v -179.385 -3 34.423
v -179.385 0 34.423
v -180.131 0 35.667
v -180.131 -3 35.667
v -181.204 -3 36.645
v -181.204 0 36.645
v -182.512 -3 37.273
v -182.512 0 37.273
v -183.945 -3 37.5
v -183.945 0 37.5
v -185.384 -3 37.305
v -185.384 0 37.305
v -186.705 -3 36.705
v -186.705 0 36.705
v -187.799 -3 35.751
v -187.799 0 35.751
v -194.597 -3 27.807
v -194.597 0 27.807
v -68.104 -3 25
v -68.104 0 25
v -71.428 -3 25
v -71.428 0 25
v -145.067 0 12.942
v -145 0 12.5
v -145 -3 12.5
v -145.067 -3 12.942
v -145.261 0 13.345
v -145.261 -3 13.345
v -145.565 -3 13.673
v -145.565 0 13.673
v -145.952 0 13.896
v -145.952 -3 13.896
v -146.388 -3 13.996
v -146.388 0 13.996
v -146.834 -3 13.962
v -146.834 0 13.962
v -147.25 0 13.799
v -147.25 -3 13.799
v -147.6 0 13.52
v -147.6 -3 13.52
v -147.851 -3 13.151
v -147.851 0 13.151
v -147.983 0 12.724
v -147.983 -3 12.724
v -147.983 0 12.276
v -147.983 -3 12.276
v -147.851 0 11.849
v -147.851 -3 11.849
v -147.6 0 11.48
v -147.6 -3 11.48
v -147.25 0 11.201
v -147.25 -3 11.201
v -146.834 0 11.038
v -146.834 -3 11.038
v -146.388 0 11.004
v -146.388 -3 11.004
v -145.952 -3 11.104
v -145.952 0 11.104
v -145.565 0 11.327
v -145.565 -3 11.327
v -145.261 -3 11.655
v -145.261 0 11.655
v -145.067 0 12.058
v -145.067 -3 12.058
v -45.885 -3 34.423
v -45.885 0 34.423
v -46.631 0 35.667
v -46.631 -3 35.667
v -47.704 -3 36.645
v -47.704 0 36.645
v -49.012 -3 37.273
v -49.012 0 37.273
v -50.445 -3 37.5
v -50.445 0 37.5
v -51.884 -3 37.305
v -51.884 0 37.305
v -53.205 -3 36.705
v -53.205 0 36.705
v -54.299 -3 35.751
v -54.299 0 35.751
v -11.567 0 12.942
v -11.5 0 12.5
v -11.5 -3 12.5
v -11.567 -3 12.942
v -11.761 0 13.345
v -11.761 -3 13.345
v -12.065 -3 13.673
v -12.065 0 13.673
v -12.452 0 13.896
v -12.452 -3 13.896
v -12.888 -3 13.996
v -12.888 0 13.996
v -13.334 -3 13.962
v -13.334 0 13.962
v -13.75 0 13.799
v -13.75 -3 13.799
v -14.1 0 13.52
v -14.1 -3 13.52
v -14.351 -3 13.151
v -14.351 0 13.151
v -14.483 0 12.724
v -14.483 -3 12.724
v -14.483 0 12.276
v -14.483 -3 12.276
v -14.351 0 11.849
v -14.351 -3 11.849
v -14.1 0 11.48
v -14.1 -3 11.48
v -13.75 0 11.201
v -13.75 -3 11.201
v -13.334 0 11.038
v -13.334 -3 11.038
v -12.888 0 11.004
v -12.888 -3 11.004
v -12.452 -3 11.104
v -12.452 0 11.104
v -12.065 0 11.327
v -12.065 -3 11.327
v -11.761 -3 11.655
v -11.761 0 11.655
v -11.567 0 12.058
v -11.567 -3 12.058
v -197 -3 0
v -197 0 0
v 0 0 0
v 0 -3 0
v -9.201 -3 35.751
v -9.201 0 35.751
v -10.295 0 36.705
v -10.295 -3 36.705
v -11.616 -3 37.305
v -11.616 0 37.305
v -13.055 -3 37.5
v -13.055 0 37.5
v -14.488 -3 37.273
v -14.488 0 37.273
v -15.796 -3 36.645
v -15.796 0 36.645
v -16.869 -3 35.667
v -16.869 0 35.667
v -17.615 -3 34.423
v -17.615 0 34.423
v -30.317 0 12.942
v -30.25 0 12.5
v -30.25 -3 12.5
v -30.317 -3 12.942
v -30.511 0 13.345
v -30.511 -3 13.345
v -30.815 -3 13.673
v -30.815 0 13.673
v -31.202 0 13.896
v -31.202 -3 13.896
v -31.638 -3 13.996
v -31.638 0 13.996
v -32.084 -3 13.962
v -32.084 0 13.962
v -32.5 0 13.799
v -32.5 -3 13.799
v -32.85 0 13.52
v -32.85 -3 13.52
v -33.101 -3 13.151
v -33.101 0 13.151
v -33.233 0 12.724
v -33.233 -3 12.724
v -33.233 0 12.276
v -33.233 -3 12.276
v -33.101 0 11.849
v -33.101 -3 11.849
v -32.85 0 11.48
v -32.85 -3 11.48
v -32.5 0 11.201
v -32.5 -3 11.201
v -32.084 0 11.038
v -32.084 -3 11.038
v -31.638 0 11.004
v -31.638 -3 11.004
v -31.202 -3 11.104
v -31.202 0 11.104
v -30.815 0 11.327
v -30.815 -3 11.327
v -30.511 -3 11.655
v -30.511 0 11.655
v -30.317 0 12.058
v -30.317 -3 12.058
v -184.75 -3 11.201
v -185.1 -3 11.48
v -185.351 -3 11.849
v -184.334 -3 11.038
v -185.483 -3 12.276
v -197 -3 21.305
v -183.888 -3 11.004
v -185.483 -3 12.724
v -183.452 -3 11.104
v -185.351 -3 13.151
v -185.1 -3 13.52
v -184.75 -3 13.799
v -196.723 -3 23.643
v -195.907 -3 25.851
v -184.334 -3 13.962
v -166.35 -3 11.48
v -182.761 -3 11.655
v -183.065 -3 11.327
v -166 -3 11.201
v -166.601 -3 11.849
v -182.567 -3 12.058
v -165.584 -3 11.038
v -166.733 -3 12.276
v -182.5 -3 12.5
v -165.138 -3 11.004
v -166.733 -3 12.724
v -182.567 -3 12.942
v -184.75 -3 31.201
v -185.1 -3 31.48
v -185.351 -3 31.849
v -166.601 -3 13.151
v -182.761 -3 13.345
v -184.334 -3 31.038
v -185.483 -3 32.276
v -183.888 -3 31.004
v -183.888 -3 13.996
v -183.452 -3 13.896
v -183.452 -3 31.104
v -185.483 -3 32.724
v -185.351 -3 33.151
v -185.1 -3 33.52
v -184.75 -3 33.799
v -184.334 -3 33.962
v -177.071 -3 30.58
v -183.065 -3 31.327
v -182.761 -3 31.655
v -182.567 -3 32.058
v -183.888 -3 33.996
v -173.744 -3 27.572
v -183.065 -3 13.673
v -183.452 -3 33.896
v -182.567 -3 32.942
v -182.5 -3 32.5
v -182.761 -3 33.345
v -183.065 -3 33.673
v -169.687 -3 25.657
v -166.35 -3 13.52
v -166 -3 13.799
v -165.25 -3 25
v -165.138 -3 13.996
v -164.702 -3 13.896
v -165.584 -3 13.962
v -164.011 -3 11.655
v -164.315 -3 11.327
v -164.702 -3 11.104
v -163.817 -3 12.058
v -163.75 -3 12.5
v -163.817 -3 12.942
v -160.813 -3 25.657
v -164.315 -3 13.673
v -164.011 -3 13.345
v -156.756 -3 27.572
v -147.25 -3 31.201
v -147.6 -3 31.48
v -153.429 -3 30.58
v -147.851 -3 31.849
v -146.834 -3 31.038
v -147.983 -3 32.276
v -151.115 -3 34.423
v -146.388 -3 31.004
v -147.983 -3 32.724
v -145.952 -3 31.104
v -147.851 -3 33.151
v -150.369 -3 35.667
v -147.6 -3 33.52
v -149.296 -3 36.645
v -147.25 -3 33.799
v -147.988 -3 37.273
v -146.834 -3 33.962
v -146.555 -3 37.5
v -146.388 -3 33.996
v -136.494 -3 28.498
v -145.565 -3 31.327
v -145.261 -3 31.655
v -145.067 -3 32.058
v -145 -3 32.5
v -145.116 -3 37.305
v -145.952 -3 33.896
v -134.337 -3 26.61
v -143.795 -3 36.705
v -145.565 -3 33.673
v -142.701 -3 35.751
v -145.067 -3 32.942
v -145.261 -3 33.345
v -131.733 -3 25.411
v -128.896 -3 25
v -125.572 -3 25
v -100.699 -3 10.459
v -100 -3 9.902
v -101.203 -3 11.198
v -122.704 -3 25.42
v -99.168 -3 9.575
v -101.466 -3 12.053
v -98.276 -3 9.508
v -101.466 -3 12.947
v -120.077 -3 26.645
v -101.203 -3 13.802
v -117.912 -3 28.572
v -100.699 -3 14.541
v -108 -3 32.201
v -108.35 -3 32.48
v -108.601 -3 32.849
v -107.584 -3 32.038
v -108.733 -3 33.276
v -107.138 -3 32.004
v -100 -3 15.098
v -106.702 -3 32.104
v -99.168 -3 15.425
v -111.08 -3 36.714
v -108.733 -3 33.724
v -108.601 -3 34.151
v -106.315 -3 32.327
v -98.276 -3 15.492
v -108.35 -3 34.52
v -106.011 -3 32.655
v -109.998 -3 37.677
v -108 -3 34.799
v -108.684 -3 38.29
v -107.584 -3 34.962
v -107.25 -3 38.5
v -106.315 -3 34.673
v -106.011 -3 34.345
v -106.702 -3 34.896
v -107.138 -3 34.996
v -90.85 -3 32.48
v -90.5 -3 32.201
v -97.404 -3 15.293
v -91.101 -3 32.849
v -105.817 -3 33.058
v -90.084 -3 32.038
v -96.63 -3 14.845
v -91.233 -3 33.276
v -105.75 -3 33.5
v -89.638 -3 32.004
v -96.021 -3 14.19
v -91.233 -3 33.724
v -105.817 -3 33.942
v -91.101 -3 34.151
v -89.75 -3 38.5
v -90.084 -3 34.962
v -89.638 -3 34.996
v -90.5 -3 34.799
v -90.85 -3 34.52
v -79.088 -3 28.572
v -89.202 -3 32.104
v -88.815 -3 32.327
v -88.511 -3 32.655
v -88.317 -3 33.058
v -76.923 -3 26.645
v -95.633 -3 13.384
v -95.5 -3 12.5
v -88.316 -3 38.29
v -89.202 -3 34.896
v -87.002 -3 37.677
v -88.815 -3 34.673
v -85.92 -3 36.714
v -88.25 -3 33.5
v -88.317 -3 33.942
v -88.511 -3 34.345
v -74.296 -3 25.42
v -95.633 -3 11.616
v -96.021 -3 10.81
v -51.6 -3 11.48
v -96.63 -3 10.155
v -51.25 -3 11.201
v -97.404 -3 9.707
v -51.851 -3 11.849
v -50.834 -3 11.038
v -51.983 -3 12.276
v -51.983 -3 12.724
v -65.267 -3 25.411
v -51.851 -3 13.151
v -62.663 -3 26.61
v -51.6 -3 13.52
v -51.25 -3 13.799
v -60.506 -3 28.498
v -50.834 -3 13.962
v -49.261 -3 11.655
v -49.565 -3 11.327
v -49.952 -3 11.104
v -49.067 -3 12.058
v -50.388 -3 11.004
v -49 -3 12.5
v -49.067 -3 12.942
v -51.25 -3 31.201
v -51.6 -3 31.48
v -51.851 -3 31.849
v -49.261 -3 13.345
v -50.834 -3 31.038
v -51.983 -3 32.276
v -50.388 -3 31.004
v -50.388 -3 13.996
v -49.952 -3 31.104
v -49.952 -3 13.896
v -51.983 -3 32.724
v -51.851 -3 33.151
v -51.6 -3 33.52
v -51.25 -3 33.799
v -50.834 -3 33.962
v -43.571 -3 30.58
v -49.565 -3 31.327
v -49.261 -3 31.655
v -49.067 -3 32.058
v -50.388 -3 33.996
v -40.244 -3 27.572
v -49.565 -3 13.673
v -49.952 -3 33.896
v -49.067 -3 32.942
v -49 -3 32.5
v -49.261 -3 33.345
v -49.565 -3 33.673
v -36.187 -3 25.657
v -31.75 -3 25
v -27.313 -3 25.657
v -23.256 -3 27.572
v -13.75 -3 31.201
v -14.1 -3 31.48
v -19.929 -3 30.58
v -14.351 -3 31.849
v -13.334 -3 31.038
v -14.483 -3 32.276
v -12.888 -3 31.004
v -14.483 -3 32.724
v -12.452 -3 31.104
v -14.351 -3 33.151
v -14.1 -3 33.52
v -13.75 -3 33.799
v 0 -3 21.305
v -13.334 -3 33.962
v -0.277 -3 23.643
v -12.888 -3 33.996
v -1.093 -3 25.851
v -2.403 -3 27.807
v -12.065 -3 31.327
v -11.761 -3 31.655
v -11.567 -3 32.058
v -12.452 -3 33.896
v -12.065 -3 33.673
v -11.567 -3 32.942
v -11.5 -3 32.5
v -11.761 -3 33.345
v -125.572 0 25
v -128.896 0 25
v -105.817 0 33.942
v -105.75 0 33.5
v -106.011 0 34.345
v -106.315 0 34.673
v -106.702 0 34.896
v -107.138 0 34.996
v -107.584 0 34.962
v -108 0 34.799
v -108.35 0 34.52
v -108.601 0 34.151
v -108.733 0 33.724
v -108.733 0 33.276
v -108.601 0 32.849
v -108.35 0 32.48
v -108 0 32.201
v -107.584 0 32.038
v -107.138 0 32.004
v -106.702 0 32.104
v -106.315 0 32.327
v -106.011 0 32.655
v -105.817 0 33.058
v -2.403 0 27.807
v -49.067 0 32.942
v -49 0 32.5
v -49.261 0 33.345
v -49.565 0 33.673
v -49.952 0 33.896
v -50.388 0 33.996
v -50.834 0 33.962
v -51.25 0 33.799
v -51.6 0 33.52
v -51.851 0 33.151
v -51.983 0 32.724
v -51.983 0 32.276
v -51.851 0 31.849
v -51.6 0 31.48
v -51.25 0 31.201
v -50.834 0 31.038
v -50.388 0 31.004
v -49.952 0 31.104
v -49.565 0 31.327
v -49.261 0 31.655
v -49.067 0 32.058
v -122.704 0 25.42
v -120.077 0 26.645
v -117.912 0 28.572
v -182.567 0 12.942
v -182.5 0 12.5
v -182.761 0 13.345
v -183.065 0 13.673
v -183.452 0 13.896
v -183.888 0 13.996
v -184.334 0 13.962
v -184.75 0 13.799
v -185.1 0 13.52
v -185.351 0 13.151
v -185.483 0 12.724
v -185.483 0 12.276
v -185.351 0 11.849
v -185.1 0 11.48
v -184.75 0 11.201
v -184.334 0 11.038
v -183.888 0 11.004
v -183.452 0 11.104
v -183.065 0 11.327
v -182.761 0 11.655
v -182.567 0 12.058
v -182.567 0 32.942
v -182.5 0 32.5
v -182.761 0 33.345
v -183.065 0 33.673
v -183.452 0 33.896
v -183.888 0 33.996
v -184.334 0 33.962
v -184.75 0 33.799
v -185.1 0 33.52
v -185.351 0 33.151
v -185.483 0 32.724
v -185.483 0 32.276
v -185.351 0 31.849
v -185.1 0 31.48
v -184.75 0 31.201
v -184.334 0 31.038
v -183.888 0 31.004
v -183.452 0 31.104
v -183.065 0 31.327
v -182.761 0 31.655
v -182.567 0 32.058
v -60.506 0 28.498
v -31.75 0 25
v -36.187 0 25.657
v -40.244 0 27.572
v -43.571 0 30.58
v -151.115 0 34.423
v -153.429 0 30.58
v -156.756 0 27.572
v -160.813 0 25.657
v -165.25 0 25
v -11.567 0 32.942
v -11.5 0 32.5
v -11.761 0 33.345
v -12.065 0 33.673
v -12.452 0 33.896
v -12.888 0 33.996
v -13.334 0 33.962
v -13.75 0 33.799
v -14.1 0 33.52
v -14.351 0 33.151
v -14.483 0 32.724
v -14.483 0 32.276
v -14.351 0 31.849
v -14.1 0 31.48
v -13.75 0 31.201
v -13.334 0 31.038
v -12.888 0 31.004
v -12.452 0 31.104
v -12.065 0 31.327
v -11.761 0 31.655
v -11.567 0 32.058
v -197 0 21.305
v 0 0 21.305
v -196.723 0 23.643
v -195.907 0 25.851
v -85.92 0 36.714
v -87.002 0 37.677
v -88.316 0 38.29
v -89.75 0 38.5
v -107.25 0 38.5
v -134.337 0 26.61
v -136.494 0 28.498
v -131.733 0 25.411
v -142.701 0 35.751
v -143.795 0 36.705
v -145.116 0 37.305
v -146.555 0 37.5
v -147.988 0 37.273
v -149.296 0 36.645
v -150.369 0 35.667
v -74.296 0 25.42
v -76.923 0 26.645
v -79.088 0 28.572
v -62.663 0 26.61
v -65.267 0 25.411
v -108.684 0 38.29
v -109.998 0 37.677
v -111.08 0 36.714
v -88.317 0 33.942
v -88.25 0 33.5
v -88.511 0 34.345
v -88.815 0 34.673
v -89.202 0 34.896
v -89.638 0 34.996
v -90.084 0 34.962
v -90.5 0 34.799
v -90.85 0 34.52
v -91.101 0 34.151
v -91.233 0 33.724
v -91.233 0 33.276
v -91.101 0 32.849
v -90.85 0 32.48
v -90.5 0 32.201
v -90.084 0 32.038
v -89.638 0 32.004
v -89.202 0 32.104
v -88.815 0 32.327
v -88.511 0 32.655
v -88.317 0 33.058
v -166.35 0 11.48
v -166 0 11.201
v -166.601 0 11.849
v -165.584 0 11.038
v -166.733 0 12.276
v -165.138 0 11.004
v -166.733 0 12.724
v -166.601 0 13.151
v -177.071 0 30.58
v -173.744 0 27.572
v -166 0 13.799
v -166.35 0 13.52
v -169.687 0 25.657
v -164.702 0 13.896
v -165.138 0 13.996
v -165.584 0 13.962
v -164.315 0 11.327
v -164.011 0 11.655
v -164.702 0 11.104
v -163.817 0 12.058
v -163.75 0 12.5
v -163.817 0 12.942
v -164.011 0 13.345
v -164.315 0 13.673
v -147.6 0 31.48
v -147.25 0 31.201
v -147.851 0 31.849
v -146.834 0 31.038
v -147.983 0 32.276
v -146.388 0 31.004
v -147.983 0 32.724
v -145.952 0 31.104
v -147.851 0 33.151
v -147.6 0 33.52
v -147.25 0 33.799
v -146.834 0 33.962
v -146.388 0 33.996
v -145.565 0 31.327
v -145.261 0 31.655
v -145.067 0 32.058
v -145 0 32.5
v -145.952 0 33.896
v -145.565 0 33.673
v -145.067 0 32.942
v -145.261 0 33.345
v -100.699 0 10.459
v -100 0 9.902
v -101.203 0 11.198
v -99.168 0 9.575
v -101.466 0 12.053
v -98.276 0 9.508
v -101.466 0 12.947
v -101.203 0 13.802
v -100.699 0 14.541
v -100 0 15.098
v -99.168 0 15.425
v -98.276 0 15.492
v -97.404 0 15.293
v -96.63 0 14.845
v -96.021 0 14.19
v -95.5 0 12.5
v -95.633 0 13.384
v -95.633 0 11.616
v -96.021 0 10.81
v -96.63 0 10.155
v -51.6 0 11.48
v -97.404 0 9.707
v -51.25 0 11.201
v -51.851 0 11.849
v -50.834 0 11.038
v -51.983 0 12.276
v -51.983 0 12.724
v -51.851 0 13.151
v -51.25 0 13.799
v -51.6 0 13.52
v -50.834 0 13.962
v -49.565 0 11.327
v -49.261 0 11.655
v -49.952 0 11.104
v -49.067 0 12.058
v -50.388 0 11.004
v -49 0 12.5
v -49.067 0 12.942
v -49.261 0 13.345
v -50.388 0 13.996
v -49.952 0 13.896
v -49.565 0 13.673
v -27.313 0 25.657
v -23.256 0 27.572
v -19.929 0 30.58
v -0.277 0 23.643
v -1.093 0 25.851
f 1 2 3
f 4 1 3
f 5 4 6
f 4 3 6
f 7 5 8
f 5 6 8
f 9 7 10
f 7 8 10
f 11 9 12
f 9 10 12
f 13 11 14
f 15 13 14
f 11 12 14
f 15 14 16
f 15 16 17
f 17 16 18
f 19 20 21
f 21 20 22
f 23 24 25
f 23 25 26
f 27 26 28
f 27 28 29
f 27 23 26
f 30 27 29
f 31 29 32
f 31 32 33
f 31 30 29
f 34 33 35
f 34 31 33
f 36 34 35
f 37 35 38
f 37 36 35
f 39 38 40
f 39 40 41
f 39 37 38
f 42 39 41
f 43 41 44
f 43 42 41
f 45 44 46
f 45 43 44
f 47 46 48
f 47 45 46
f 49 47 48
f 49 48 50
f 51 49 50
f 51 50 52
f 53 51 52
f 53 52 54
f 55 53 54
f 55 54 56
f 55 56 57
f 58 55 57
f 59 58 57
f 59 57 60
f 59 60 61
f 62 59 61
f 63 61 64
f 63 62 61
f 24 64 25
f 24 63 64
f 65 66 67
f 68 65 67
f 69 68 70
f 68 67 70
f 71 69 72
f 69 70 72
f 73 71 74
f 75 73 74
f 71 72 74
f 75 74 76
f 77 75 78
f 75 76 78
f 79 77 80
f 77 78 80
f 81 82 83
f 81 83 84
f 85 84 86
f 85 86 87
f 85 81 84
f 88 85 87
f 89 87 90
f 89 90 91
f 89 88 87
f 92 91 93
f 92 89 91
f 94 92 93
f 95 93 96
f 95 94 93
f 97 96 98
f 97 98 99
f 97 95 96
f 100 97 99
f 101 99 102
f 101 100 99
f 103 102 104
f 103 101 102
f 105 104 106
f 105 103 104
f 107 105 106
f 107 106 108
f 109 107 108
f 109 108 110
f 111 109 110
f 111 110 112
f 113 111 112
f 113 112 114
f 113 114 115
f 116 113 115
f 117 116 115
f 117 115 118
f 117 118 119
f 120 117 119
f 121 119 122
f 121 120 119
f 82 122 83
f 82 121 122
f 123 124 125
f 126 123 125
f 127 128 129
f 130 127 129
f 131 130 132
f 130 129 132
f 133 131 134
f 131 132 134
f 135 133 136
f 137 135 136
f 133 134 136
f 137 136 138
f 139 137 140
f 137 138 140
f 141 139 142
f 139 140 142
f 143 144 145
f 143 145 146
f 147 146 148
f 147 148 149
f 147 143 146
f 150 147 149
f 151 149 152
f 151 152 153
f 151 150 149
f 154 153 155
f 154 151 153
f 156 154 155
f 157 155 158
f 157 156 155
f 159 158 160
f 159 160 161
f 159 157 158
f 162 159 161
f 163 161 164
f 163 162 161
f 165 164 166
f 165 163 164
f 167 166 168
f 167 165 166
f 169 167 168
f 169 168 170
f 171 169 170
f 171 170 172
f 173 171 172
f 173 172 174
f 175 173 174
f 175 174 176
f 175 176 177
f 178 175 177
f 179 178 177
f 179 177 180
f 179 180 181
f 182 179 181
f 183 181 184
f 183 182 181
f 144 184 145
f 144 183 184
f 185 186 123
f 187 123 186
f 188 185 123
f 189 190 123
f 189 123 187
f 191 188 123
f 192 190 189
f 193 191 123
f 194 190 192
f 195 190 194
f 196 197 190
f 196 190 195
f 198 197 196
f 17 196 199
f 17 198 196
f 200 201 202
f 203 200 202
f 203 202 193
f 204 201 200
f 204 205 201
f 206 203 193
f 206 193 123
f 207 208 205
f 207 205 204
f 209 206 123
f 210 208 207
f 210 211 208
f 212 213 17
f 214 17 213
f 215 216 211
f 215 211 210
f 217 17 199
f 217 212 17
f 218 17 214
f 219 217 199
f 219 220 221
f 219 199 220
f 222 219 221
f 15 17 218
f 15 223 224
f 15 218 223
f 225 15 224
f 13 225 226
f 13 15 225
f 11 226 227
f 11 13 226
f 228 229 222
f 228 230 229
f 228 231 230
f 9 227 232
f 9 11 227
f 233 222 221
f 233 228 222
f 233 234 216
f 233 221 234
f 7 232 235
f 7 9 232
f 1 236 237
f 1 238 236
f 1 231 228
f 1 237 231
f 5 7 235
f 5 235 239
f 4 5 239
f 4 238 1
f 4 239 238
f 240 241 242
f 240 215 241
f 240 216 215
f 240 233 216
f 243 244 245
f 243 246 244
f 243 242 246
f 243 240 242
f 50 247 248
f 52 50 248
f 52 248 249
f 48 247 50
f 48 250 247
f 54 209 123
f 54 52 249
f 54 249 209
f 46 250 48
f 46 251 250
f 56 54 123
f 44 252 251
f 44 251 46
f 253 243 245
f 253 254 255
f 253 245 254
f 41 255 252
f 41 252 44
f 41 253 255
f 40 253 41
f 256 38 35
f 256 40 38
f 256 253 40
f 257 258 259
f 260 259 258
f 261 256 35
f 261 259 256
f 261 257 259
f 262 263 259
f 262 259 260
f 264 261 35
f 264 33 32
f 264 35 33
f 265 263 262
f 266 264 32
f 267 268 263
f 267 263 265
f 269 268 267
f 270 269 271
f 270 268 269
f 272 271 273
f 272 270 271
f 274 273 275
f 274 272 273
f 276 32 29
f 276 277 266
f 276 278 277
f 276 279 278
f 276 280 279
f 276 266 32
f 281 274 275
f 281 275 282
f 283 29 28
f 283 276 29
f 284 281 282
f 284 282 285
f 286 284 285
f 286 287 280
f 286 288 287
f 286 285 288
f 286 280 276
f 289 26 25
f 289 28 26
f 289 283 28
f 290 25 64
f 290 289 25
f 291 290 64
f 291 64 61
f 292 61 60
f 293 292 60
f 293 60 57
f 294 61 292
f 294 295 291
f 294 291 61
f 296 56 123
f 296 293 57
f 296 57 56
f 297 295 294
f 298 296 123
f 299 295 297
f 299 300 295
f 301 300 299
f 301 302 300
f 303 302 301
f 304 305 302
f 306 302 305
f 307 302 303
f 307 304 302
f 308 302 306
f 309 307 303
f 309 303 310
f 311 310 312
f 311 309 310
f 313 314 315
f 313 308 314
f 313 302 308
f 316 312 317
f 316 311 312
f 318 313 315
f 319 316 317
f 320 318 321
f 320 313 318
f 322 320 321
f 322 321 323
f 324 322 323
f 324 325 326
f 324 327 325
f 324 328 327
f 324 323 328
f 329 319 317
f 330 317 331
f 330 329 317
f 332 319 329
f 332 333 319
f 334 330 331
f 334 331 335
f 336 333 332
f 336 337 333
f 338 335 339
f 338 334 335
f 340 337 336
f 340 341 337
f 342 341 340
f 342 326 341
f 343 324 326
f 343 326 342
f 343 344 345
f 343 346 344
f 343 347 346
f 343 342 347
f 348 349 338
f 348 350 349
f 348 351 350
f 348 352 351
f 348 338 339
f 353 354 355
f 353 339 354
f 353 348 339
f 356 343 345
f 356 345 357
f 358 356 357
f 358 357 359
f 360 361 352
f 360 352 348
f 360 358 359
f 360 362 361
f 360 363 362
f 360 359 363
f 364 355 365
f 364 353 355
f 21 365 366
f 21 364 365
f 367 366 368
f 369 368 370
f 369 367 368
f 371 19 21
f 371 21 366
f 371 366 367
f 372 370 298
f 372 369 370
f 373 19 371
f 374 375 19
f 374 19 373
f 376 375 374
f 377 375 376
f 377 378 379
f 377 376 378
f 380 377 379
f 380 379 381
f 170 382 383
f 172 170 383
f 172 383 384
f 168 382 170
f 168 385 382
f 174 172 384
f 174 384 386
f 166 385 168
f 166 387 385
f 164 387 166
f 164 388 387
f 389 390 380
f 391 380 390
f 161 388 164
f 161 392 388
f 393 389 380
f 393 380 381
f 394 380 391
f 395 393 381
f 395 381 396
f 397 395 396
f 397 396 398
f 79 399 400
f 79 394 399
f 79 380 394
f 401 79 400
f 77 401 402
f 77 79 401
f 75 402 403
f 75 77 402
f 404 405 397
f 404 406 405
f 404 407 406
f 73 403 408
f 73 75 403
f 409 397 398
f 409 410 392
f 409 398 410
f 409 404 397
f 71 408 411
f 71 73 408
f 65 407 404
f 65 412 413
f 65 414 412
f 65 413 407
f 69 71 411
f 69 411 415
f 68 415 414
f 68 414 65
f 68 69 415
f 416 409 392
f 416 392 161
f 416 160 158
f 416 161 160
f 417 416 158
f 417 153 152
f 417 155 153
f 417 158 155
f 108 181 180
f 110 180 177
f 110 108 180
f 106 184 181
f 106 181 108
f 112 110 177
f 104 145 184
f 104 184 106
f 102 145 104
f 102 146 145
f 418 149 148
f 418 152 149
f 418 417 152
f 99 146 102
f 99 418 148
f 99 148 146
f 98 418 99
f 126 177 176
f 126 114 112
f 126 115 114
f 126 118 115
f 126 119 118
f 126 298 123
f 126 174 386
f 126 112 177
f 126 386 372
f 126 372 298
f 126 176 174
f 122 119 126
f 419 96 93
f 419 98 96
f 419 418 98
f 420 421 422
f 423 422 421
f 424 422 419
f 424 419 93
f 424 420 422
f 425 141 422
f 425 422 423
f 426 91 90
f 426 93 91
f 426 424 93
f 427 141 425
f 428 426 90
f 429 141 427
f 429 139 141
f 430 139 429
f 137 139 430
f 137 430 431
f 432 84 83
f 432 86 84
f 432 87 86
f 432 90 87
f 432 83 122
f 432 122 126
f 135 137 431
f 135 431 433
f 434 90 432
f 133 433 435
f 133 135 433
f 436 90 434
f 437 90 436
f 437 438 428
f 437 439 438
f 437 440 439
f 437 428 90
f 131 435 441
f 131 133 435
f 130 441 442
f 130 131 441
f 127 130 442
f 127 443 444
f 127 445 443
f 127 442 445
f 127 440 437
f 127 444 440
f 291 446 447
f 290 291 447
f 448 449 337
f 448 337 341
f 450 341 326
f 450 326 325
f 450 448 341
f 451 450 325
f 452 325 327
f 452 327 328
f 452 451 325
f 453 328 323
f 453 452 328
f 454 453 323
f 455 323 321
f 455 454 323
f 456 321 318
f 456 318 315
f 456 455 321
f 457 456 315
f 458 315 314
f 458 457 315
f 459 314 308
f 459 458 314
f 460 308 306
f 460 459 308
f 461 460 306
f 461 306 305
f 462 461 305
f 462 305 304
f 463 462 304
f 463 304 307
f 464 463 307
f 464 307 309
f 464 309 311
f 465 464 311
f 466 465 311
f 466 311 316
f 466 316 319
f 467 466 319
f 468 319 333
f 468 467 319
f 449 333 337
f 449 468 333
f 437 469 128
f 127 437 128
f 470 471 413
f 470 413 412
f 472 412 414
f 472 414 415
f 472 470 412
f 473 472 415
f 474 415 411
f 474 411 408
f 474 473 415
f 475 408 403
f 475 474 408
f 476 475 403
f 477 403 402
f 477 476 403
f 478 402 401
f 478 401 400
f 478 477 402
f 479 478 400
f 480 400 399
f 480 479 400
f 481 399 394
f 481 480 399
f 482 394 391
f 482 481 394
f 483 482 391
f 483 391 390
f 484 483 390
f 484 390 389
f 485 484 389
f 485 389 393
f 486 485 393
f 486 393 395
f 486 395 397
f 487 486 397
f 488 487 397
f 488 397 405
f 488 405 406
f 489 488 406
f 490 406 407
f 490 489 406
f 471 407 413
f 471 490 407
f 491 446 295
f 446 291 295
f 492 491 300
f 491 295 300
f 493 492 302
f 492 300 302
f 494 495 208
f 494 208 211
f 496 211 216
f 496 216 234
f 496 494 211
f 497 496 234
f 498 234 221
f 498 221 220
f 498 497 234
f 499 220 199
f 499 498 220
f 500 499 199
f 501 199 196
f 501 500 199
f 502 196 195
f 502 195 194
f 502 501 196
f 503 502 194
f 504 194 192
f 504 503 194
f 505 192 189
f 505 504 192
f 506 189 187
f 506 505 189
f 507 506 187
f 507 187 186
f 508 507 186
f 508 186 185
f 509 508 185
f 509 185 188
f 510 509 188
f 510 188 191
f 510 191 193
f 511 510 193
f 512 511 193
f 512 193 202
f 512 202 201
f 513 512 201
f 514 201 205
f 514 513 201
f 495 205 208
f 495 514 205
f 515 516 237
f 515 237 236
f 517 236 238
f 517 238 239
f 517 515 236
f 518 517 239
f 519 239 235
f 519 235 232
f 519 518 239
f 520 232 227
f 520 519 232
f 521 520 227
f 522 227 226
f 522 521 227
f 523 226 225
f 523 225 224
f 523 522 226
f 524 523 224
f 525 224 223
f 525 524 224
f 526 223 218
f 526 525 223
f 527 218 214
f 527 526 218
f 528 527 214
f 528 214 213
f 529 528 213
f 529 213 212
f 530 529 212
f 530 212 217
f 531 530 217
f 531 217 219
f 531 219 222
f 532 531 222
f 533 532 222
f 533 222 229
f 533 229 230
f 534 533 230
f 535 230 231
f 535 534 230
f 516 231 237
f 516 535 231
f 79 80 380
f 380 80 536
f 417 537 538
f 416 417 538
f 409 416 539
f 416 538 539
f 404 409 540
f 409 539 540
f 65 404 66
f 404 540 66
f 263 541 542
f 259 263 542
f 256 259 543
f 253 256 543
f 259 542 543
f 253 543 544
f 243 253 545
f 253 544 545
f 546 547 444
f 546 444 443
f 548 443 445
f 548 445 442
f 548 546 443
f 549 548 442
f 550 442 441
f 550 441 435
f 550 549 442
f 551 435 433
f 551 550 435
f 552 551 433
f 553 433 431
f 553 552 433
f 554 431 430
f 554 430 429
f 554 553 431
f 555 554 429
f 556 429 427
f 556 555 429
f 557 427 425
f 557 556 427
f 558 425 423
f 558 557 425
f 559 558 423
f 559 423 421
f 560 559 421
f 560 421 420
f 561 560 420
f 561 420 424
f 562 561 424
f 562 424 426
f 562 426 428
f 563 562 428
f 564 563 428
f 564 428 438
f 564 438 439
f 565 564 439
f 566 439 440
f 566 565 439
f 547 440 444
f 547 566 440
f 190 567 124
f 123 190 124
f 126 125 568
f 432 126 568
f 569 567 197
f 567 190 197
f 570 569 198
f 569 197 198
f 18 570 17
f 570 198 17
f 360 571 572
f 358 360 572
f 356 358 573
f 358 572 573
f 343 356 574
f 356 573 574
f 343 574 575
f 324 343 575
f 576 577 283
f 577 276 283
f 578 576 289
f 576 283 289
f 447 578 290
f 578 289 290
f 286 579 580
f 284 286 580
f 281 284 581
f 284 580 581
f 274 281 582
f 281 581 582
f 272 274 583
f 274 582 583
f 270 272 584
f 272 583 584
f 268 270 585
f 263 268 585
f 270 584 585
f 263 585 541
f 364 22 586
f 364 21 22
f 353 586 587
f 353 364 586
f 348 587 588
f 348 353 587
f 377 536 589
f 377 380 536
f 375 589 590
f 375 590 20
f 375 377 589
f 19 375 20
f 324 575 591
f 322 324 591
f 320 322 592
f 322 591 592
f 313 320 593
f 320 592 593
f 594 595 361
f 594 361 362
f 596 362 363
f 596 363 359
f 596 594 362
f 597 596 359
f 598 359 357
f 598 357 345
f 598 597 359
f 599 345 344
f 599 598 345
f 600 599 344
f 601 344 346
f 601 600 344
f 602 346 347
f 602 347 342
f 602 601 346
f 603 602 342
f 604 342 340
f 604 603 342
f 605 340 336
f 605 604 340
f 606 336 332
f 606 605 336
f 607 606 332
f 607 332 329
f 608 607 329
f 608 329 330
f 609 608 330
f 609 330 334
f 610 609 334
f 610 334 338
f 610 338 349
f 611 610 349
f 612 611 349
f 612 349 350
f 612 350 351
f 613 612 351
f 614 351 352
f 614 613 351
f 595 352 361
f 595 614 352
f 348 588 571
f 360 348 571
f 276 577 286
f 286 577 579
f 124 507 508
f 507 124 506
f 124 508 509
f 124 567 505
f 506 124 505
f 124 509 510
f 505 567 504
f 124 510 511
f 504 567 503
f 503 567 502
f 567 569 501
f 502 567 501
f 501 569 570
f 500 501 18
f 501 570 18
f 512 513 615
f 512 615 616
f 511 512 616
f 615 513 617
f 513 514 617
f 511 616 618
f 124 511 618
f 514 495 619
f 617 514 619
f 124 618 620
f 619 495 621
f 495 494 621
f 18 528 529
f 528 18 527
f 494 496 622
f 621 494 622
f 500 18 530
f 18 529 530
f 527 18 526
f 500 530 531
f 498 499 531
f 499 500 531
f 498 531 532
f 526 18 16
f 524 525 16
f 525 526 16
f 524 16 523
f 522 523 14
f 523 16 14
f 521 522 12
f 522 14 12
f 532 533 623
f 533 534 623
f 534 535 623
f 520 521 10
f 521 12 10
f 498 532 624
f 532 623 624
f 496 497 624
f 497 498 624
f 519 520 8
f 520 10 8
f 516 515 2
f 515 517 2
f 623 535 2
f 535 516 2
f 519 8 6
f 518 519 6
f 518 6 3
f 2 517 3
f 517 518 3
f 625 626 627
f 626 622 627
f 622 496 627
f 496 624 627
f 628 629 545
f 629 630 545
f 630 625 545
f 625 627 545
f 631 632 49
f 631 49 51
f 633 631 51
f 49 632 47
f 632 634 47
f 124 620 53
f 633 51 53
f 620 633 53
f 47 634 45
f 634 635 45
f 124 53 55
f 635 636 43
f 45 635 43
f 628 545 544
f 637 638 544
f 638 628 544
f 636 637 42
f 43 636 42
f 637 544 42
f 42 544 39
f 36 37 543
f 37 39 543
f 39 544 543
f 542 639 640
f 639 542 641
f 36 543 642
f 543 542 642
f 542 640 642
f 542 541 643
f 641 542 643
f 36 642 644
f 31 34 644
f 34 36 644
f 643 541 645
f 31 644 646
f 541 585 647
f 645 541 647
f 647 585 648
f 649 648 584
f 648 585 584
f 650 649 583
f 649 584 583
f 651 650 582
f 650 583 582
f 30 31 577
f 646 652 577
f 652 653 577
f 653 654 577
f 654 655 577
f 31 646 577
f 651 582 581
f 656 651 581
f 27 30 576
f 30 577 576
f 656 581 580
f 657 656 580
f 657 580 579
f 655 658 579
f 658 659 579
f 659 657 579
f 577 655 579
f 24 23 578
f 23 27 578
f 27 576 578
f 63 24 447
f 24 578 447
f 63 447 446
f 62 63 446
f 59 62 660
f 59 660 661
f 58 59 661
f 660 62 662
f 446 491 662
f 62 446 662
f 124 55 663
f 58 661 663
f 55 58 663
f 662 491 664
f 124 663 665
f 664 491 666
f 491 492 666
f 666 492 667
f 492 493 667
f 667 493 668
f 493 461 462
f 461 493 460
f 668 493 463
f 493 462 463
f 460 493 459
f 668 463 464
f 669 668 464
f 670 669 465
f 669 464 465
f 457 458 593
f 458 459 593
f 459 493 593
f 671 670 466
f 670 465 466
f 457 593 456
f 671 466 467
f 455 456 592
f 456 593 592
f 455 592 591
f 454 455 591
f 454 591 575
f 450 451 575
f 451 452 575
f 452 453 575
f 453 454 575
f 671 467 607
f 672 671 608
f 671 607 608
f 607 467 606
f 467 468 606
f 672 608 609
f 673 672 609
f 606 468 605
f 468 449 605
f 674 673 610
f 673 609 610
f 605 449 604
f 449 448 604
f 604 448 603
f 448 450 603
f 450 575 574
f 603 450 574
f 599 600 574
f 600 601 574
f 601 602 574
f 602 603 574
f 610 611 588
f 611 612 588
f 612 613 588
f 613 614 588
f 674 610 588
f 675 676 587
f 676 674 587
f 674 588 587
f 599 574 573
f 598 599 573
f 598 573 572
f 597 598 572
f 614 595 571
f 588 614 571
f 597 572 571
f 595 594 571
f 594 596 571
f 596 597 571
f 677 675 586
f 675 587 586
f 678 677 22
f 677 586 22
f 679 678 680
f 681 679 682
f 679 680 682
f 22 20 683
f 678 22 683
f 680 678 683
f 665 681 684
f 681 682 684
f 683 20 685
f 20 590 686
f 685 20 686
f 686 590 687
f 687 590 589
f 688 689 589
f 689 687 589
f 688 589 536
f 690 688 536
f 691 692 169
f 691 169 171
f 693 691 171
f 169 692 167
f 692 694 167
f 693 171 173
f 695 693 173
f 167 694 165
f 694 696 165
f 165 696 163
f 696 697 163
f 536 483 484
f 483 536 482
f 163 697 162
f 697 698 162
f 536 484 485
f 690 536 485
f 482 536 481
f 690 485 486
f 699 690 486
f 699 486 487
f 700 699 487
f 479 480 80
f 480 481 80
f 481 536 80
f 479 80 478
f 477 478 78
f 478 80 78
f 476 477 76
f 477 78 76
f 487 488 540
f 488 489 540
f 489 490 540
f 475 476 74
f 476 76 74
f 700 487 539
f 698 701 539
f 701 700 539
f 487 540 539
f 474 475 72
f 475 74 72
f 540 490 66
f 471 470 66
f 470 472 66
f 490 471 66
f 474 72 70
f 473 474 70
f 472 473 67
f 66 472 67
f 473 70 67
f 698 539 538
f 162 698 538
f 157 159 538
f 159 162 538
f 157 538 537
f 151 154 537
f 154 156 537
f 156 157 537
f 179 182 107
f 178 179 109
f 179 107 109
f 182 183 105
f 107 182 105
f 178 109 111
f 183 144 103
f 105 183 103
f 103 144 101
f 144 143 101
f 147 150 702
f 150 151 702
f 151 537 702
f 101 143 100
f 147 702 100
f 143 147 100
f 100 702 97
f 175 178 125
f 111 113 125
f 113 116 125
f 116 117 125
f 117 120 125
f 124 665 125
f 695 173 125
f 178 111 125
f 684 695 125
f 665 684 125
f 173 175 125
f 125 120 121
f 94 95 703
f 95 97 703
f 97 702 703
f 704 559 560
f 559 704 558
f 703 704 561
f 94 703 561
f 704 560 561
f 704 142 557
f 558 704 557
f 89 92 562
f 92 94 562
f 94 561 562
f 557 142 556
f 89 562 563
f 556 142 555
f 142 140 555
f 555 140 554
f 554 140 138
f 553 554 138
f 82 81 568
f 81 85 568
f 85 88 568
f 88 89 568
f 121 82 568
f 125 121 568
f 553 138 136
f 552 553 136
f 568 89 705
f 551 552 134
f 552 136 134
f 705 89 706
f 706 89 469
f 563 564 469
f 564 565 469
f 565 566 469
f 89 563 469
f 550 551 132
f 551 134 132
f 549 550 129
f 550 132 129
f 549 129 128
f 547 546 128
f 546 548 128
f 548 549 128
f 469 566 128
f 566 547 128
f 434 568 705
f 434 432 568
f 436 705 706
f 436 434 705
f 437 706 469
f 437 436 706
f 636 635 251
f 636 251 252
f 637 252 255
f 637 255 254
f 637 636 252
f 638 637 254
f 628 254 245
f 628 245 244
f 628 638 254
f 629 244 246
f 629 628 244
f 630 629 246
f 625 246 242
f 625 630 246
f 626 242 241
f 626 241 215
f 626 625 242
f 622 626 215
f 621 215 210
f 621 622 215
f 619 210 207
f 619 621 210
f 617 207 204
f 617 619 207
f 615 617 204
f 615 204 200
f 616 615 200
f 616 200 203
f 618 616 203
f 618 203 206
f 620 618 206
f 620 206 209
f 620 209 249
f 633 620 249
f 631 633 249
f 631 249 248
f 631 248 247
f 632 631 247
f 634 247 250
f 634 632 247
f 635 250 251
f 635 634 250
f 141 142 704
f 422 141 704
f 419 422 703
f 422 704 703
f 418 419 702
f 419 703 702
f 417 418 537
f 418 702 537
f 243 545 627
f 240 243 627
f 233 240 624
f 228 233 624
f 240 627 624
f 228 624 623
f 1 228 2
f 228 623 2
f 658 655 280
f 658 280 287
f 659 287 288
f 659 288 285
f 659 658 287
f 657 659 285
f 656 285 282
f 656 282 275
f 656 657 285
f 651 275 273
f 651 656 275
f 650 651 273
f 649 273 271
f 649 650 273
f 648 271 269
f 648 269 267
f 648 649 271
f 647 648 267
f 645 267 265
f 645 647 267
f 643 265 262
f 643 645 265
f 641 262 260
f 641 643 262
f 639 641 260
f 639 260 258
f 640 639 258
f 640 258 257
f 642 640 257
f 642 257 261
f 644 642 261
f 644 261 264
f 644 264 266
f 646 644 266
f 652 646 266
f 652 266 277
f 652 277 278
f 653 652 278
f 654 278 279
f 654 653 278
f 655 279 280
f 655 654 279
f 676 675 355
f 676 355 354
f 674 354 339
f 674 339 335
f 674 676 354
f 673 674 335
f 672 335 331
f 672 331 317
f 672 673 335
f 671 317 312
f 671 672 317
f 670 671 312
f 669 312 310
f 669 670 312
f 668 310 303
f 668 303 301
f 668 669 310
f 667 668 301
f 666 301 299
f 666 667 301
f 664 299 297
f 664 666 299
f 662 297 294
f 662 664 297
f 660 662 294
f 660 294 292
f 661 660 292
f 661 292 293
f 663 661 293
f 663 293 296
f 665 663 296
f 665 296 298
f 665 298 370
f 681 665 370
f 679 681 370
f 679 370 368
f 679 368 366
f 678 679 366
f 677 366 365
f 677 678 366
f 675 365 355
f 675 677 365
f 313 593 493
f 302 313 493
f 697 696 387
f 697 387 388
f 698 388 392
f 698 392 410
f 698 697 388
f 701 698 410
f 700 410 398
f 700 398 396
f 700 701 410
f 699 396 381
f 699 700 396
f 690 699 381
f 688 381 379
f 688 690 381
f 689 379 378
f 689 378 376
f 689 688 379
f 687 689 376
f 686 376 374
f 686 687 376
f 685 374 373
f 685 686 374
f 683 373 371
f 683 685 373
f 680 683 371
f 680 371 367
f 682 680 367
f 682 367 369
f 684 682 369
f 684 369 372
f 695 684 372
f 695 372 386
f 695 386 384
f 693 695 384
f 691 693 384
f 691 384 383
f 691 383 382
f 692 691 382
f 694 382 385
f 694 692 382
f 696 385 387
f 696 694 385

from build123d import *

# Parameters (mm, degrees)
F0_R     = 1.5
F0_R_2   = 3
F1_DEPTH = 3
F2_R     = 10


# Not quite as in the source:
# - a feature names something its author has since deleted; it is built from what else it names


with BuildPart() as f1:
    # F0 (on Front) → F1 (new body)
    with BuildSketch(Plane.XZ):
        Polygon((-197, 0), (0, 0), (0, 25), (-31.75, 25), (-63.5, 25), (-76.0906166883, 25), (-120.9093833117, 25), (-133.5, 25), (-165.25, 25), (-197, 25), align=None)
        with Locations((-184, 12.5)):
            Circle(F0_R, mode=Mode.SUBTRACT)
        with Locations((-165.25, 12.5)):
            Circle(F0_R, mode=Mode.SUBTRACT)
        with Locations((-146.5, 12.5)):
            Circle(F0_R, mode=Mode.SUBTRACT)
        with Locations((-98.5, 12.5)):
            Circle(F0_R_2, mode=Mode.SUBTRACT)
        with Locations((-50.5, 12.5)):
            Circle(F0_R, mode=Mode.SUBTRACT)
        with Locations((-31.75, 12.5)):
            Circle(F0_R, mode=Mode.SUBTRACT)
        with Locations((-13, 12.5)):
            Circle(F0_R, mode=Mode.SUBTRACT)
        with BuildLine():
            Line((-63.5, 25), (-31.75, 25))
            ThreePointArc((-31.75, 25), (-40.2438467547, 27.571729868), (-45.8846153846, 34.4230769231))
            ThreePointArc((-45.8846153846, 34.4230769231), (-49.720477364, 37.4388606439), (-54.2987189286, 35.7511128097))
            Line((-54.2987189286, 35.7511128097), (-63.5, 25))
        make_face()
        with Locations((-50.5, 32.5)):
            Circle(F0_R, mode=Mode.SUBTRACT)
        with BuildLine():
            Line((-31.75, 25), (0, 25))
            Line((0, 25), (-9.2012810714, 35.7511128097))
            ThreePointArc((-9.2012810714, 35.7511128097), (-13.779522636, 37.4388606439), (-17.6153846154, 34.4230769231))
            ThreePointArc((-17.6153846154, 34.4230769231), (-23.2561532453, 27.571729868), (-31.75, 25))
        make_face()
        with Locations((-13, 32.5)):
            Circle(F0_R, mode=Mode.SUBTRACT)
        with BuildLine():
            Line((-187.7987189286, 35.7511128097), (-197, 25))
            Line((-197, 25), (-165.25, 25))
            ThreePointArc((-165.25, 25), (-173.7438467547, 27.571729868), (-179.3846153846, 34.4230769231))
            ThreePointArc((-179.3846153846, 34.4230769231), (-183.220477364, 37.4388606439), (-187.7987189286, 35.7511128097))
        make_face()
        with Locations((-184, 32.5)):
            Circle(F0_R, mode=Mode.SUBTRACT)
        with BuildLine():
            ThreePointArc((-151.1153846154, 34.4230769231), (-156.7561532453, 27.571729868), (-165.25, 25))
            Line((-165.25, 25), (-133.5, 25))
            Line((-133.5, 25), (-142.7012810714, 35.7511128097))
            ThreePointArc((-142.7012810714, 35.7511128097), (-147.279522636, 37.4388606439), (-151.1153846154, 34.4230769231))
        make_face()
        with Locations((-146.5, 32.5)):
            Circle(F0_R, mode=Mode.SUBTRACT)
        with BuildLine():
            Line((-120.9093833117, 25), (-76.0906166883, 25))
            Line((-76.0906166883, 25), (-85.9197777844, 36.7139380484))
            ThreePointArc((-85.9197777844, 36.7139380484), (-87.6369086913, 38.0315389352), (-89.75, 38.5))
            Line((-89.75, 38.5), (-107.25, 38.5))
            ThreePointArc((-107.25, 38.5), (-109.3630913087, 38.0315389352), (-111.0802222156, 36.7139380484))
            Line((-111.0802222156, 36.7139380484), (-120.9093833117, 25))
        make_face()
        with Locations((-107.25, 33.5)):
            Circle(F0_R, mode=Mode.SUBTRACT)
        with Locations((-89.75, 33.5)):
            Circle(F0_R, mode=Mode.SUBTRACT)
    extrude(amount=F1_DEPTH)

    # F2
    f2_edges = [f1.edges().sort_by_distance(p)[0] for p in [
        (0, -1.5, 25),
        (-197, -1.5, 25),
        (-133.5, -1.5, 25),
        (-63.5, -1.5, 25),
        (-120.909383, -1.5, 25),
        (-76.090617, -1.5, 25),
    ]]
    fillet(f2_edges, radius=F2_R)


solid = f1.part
